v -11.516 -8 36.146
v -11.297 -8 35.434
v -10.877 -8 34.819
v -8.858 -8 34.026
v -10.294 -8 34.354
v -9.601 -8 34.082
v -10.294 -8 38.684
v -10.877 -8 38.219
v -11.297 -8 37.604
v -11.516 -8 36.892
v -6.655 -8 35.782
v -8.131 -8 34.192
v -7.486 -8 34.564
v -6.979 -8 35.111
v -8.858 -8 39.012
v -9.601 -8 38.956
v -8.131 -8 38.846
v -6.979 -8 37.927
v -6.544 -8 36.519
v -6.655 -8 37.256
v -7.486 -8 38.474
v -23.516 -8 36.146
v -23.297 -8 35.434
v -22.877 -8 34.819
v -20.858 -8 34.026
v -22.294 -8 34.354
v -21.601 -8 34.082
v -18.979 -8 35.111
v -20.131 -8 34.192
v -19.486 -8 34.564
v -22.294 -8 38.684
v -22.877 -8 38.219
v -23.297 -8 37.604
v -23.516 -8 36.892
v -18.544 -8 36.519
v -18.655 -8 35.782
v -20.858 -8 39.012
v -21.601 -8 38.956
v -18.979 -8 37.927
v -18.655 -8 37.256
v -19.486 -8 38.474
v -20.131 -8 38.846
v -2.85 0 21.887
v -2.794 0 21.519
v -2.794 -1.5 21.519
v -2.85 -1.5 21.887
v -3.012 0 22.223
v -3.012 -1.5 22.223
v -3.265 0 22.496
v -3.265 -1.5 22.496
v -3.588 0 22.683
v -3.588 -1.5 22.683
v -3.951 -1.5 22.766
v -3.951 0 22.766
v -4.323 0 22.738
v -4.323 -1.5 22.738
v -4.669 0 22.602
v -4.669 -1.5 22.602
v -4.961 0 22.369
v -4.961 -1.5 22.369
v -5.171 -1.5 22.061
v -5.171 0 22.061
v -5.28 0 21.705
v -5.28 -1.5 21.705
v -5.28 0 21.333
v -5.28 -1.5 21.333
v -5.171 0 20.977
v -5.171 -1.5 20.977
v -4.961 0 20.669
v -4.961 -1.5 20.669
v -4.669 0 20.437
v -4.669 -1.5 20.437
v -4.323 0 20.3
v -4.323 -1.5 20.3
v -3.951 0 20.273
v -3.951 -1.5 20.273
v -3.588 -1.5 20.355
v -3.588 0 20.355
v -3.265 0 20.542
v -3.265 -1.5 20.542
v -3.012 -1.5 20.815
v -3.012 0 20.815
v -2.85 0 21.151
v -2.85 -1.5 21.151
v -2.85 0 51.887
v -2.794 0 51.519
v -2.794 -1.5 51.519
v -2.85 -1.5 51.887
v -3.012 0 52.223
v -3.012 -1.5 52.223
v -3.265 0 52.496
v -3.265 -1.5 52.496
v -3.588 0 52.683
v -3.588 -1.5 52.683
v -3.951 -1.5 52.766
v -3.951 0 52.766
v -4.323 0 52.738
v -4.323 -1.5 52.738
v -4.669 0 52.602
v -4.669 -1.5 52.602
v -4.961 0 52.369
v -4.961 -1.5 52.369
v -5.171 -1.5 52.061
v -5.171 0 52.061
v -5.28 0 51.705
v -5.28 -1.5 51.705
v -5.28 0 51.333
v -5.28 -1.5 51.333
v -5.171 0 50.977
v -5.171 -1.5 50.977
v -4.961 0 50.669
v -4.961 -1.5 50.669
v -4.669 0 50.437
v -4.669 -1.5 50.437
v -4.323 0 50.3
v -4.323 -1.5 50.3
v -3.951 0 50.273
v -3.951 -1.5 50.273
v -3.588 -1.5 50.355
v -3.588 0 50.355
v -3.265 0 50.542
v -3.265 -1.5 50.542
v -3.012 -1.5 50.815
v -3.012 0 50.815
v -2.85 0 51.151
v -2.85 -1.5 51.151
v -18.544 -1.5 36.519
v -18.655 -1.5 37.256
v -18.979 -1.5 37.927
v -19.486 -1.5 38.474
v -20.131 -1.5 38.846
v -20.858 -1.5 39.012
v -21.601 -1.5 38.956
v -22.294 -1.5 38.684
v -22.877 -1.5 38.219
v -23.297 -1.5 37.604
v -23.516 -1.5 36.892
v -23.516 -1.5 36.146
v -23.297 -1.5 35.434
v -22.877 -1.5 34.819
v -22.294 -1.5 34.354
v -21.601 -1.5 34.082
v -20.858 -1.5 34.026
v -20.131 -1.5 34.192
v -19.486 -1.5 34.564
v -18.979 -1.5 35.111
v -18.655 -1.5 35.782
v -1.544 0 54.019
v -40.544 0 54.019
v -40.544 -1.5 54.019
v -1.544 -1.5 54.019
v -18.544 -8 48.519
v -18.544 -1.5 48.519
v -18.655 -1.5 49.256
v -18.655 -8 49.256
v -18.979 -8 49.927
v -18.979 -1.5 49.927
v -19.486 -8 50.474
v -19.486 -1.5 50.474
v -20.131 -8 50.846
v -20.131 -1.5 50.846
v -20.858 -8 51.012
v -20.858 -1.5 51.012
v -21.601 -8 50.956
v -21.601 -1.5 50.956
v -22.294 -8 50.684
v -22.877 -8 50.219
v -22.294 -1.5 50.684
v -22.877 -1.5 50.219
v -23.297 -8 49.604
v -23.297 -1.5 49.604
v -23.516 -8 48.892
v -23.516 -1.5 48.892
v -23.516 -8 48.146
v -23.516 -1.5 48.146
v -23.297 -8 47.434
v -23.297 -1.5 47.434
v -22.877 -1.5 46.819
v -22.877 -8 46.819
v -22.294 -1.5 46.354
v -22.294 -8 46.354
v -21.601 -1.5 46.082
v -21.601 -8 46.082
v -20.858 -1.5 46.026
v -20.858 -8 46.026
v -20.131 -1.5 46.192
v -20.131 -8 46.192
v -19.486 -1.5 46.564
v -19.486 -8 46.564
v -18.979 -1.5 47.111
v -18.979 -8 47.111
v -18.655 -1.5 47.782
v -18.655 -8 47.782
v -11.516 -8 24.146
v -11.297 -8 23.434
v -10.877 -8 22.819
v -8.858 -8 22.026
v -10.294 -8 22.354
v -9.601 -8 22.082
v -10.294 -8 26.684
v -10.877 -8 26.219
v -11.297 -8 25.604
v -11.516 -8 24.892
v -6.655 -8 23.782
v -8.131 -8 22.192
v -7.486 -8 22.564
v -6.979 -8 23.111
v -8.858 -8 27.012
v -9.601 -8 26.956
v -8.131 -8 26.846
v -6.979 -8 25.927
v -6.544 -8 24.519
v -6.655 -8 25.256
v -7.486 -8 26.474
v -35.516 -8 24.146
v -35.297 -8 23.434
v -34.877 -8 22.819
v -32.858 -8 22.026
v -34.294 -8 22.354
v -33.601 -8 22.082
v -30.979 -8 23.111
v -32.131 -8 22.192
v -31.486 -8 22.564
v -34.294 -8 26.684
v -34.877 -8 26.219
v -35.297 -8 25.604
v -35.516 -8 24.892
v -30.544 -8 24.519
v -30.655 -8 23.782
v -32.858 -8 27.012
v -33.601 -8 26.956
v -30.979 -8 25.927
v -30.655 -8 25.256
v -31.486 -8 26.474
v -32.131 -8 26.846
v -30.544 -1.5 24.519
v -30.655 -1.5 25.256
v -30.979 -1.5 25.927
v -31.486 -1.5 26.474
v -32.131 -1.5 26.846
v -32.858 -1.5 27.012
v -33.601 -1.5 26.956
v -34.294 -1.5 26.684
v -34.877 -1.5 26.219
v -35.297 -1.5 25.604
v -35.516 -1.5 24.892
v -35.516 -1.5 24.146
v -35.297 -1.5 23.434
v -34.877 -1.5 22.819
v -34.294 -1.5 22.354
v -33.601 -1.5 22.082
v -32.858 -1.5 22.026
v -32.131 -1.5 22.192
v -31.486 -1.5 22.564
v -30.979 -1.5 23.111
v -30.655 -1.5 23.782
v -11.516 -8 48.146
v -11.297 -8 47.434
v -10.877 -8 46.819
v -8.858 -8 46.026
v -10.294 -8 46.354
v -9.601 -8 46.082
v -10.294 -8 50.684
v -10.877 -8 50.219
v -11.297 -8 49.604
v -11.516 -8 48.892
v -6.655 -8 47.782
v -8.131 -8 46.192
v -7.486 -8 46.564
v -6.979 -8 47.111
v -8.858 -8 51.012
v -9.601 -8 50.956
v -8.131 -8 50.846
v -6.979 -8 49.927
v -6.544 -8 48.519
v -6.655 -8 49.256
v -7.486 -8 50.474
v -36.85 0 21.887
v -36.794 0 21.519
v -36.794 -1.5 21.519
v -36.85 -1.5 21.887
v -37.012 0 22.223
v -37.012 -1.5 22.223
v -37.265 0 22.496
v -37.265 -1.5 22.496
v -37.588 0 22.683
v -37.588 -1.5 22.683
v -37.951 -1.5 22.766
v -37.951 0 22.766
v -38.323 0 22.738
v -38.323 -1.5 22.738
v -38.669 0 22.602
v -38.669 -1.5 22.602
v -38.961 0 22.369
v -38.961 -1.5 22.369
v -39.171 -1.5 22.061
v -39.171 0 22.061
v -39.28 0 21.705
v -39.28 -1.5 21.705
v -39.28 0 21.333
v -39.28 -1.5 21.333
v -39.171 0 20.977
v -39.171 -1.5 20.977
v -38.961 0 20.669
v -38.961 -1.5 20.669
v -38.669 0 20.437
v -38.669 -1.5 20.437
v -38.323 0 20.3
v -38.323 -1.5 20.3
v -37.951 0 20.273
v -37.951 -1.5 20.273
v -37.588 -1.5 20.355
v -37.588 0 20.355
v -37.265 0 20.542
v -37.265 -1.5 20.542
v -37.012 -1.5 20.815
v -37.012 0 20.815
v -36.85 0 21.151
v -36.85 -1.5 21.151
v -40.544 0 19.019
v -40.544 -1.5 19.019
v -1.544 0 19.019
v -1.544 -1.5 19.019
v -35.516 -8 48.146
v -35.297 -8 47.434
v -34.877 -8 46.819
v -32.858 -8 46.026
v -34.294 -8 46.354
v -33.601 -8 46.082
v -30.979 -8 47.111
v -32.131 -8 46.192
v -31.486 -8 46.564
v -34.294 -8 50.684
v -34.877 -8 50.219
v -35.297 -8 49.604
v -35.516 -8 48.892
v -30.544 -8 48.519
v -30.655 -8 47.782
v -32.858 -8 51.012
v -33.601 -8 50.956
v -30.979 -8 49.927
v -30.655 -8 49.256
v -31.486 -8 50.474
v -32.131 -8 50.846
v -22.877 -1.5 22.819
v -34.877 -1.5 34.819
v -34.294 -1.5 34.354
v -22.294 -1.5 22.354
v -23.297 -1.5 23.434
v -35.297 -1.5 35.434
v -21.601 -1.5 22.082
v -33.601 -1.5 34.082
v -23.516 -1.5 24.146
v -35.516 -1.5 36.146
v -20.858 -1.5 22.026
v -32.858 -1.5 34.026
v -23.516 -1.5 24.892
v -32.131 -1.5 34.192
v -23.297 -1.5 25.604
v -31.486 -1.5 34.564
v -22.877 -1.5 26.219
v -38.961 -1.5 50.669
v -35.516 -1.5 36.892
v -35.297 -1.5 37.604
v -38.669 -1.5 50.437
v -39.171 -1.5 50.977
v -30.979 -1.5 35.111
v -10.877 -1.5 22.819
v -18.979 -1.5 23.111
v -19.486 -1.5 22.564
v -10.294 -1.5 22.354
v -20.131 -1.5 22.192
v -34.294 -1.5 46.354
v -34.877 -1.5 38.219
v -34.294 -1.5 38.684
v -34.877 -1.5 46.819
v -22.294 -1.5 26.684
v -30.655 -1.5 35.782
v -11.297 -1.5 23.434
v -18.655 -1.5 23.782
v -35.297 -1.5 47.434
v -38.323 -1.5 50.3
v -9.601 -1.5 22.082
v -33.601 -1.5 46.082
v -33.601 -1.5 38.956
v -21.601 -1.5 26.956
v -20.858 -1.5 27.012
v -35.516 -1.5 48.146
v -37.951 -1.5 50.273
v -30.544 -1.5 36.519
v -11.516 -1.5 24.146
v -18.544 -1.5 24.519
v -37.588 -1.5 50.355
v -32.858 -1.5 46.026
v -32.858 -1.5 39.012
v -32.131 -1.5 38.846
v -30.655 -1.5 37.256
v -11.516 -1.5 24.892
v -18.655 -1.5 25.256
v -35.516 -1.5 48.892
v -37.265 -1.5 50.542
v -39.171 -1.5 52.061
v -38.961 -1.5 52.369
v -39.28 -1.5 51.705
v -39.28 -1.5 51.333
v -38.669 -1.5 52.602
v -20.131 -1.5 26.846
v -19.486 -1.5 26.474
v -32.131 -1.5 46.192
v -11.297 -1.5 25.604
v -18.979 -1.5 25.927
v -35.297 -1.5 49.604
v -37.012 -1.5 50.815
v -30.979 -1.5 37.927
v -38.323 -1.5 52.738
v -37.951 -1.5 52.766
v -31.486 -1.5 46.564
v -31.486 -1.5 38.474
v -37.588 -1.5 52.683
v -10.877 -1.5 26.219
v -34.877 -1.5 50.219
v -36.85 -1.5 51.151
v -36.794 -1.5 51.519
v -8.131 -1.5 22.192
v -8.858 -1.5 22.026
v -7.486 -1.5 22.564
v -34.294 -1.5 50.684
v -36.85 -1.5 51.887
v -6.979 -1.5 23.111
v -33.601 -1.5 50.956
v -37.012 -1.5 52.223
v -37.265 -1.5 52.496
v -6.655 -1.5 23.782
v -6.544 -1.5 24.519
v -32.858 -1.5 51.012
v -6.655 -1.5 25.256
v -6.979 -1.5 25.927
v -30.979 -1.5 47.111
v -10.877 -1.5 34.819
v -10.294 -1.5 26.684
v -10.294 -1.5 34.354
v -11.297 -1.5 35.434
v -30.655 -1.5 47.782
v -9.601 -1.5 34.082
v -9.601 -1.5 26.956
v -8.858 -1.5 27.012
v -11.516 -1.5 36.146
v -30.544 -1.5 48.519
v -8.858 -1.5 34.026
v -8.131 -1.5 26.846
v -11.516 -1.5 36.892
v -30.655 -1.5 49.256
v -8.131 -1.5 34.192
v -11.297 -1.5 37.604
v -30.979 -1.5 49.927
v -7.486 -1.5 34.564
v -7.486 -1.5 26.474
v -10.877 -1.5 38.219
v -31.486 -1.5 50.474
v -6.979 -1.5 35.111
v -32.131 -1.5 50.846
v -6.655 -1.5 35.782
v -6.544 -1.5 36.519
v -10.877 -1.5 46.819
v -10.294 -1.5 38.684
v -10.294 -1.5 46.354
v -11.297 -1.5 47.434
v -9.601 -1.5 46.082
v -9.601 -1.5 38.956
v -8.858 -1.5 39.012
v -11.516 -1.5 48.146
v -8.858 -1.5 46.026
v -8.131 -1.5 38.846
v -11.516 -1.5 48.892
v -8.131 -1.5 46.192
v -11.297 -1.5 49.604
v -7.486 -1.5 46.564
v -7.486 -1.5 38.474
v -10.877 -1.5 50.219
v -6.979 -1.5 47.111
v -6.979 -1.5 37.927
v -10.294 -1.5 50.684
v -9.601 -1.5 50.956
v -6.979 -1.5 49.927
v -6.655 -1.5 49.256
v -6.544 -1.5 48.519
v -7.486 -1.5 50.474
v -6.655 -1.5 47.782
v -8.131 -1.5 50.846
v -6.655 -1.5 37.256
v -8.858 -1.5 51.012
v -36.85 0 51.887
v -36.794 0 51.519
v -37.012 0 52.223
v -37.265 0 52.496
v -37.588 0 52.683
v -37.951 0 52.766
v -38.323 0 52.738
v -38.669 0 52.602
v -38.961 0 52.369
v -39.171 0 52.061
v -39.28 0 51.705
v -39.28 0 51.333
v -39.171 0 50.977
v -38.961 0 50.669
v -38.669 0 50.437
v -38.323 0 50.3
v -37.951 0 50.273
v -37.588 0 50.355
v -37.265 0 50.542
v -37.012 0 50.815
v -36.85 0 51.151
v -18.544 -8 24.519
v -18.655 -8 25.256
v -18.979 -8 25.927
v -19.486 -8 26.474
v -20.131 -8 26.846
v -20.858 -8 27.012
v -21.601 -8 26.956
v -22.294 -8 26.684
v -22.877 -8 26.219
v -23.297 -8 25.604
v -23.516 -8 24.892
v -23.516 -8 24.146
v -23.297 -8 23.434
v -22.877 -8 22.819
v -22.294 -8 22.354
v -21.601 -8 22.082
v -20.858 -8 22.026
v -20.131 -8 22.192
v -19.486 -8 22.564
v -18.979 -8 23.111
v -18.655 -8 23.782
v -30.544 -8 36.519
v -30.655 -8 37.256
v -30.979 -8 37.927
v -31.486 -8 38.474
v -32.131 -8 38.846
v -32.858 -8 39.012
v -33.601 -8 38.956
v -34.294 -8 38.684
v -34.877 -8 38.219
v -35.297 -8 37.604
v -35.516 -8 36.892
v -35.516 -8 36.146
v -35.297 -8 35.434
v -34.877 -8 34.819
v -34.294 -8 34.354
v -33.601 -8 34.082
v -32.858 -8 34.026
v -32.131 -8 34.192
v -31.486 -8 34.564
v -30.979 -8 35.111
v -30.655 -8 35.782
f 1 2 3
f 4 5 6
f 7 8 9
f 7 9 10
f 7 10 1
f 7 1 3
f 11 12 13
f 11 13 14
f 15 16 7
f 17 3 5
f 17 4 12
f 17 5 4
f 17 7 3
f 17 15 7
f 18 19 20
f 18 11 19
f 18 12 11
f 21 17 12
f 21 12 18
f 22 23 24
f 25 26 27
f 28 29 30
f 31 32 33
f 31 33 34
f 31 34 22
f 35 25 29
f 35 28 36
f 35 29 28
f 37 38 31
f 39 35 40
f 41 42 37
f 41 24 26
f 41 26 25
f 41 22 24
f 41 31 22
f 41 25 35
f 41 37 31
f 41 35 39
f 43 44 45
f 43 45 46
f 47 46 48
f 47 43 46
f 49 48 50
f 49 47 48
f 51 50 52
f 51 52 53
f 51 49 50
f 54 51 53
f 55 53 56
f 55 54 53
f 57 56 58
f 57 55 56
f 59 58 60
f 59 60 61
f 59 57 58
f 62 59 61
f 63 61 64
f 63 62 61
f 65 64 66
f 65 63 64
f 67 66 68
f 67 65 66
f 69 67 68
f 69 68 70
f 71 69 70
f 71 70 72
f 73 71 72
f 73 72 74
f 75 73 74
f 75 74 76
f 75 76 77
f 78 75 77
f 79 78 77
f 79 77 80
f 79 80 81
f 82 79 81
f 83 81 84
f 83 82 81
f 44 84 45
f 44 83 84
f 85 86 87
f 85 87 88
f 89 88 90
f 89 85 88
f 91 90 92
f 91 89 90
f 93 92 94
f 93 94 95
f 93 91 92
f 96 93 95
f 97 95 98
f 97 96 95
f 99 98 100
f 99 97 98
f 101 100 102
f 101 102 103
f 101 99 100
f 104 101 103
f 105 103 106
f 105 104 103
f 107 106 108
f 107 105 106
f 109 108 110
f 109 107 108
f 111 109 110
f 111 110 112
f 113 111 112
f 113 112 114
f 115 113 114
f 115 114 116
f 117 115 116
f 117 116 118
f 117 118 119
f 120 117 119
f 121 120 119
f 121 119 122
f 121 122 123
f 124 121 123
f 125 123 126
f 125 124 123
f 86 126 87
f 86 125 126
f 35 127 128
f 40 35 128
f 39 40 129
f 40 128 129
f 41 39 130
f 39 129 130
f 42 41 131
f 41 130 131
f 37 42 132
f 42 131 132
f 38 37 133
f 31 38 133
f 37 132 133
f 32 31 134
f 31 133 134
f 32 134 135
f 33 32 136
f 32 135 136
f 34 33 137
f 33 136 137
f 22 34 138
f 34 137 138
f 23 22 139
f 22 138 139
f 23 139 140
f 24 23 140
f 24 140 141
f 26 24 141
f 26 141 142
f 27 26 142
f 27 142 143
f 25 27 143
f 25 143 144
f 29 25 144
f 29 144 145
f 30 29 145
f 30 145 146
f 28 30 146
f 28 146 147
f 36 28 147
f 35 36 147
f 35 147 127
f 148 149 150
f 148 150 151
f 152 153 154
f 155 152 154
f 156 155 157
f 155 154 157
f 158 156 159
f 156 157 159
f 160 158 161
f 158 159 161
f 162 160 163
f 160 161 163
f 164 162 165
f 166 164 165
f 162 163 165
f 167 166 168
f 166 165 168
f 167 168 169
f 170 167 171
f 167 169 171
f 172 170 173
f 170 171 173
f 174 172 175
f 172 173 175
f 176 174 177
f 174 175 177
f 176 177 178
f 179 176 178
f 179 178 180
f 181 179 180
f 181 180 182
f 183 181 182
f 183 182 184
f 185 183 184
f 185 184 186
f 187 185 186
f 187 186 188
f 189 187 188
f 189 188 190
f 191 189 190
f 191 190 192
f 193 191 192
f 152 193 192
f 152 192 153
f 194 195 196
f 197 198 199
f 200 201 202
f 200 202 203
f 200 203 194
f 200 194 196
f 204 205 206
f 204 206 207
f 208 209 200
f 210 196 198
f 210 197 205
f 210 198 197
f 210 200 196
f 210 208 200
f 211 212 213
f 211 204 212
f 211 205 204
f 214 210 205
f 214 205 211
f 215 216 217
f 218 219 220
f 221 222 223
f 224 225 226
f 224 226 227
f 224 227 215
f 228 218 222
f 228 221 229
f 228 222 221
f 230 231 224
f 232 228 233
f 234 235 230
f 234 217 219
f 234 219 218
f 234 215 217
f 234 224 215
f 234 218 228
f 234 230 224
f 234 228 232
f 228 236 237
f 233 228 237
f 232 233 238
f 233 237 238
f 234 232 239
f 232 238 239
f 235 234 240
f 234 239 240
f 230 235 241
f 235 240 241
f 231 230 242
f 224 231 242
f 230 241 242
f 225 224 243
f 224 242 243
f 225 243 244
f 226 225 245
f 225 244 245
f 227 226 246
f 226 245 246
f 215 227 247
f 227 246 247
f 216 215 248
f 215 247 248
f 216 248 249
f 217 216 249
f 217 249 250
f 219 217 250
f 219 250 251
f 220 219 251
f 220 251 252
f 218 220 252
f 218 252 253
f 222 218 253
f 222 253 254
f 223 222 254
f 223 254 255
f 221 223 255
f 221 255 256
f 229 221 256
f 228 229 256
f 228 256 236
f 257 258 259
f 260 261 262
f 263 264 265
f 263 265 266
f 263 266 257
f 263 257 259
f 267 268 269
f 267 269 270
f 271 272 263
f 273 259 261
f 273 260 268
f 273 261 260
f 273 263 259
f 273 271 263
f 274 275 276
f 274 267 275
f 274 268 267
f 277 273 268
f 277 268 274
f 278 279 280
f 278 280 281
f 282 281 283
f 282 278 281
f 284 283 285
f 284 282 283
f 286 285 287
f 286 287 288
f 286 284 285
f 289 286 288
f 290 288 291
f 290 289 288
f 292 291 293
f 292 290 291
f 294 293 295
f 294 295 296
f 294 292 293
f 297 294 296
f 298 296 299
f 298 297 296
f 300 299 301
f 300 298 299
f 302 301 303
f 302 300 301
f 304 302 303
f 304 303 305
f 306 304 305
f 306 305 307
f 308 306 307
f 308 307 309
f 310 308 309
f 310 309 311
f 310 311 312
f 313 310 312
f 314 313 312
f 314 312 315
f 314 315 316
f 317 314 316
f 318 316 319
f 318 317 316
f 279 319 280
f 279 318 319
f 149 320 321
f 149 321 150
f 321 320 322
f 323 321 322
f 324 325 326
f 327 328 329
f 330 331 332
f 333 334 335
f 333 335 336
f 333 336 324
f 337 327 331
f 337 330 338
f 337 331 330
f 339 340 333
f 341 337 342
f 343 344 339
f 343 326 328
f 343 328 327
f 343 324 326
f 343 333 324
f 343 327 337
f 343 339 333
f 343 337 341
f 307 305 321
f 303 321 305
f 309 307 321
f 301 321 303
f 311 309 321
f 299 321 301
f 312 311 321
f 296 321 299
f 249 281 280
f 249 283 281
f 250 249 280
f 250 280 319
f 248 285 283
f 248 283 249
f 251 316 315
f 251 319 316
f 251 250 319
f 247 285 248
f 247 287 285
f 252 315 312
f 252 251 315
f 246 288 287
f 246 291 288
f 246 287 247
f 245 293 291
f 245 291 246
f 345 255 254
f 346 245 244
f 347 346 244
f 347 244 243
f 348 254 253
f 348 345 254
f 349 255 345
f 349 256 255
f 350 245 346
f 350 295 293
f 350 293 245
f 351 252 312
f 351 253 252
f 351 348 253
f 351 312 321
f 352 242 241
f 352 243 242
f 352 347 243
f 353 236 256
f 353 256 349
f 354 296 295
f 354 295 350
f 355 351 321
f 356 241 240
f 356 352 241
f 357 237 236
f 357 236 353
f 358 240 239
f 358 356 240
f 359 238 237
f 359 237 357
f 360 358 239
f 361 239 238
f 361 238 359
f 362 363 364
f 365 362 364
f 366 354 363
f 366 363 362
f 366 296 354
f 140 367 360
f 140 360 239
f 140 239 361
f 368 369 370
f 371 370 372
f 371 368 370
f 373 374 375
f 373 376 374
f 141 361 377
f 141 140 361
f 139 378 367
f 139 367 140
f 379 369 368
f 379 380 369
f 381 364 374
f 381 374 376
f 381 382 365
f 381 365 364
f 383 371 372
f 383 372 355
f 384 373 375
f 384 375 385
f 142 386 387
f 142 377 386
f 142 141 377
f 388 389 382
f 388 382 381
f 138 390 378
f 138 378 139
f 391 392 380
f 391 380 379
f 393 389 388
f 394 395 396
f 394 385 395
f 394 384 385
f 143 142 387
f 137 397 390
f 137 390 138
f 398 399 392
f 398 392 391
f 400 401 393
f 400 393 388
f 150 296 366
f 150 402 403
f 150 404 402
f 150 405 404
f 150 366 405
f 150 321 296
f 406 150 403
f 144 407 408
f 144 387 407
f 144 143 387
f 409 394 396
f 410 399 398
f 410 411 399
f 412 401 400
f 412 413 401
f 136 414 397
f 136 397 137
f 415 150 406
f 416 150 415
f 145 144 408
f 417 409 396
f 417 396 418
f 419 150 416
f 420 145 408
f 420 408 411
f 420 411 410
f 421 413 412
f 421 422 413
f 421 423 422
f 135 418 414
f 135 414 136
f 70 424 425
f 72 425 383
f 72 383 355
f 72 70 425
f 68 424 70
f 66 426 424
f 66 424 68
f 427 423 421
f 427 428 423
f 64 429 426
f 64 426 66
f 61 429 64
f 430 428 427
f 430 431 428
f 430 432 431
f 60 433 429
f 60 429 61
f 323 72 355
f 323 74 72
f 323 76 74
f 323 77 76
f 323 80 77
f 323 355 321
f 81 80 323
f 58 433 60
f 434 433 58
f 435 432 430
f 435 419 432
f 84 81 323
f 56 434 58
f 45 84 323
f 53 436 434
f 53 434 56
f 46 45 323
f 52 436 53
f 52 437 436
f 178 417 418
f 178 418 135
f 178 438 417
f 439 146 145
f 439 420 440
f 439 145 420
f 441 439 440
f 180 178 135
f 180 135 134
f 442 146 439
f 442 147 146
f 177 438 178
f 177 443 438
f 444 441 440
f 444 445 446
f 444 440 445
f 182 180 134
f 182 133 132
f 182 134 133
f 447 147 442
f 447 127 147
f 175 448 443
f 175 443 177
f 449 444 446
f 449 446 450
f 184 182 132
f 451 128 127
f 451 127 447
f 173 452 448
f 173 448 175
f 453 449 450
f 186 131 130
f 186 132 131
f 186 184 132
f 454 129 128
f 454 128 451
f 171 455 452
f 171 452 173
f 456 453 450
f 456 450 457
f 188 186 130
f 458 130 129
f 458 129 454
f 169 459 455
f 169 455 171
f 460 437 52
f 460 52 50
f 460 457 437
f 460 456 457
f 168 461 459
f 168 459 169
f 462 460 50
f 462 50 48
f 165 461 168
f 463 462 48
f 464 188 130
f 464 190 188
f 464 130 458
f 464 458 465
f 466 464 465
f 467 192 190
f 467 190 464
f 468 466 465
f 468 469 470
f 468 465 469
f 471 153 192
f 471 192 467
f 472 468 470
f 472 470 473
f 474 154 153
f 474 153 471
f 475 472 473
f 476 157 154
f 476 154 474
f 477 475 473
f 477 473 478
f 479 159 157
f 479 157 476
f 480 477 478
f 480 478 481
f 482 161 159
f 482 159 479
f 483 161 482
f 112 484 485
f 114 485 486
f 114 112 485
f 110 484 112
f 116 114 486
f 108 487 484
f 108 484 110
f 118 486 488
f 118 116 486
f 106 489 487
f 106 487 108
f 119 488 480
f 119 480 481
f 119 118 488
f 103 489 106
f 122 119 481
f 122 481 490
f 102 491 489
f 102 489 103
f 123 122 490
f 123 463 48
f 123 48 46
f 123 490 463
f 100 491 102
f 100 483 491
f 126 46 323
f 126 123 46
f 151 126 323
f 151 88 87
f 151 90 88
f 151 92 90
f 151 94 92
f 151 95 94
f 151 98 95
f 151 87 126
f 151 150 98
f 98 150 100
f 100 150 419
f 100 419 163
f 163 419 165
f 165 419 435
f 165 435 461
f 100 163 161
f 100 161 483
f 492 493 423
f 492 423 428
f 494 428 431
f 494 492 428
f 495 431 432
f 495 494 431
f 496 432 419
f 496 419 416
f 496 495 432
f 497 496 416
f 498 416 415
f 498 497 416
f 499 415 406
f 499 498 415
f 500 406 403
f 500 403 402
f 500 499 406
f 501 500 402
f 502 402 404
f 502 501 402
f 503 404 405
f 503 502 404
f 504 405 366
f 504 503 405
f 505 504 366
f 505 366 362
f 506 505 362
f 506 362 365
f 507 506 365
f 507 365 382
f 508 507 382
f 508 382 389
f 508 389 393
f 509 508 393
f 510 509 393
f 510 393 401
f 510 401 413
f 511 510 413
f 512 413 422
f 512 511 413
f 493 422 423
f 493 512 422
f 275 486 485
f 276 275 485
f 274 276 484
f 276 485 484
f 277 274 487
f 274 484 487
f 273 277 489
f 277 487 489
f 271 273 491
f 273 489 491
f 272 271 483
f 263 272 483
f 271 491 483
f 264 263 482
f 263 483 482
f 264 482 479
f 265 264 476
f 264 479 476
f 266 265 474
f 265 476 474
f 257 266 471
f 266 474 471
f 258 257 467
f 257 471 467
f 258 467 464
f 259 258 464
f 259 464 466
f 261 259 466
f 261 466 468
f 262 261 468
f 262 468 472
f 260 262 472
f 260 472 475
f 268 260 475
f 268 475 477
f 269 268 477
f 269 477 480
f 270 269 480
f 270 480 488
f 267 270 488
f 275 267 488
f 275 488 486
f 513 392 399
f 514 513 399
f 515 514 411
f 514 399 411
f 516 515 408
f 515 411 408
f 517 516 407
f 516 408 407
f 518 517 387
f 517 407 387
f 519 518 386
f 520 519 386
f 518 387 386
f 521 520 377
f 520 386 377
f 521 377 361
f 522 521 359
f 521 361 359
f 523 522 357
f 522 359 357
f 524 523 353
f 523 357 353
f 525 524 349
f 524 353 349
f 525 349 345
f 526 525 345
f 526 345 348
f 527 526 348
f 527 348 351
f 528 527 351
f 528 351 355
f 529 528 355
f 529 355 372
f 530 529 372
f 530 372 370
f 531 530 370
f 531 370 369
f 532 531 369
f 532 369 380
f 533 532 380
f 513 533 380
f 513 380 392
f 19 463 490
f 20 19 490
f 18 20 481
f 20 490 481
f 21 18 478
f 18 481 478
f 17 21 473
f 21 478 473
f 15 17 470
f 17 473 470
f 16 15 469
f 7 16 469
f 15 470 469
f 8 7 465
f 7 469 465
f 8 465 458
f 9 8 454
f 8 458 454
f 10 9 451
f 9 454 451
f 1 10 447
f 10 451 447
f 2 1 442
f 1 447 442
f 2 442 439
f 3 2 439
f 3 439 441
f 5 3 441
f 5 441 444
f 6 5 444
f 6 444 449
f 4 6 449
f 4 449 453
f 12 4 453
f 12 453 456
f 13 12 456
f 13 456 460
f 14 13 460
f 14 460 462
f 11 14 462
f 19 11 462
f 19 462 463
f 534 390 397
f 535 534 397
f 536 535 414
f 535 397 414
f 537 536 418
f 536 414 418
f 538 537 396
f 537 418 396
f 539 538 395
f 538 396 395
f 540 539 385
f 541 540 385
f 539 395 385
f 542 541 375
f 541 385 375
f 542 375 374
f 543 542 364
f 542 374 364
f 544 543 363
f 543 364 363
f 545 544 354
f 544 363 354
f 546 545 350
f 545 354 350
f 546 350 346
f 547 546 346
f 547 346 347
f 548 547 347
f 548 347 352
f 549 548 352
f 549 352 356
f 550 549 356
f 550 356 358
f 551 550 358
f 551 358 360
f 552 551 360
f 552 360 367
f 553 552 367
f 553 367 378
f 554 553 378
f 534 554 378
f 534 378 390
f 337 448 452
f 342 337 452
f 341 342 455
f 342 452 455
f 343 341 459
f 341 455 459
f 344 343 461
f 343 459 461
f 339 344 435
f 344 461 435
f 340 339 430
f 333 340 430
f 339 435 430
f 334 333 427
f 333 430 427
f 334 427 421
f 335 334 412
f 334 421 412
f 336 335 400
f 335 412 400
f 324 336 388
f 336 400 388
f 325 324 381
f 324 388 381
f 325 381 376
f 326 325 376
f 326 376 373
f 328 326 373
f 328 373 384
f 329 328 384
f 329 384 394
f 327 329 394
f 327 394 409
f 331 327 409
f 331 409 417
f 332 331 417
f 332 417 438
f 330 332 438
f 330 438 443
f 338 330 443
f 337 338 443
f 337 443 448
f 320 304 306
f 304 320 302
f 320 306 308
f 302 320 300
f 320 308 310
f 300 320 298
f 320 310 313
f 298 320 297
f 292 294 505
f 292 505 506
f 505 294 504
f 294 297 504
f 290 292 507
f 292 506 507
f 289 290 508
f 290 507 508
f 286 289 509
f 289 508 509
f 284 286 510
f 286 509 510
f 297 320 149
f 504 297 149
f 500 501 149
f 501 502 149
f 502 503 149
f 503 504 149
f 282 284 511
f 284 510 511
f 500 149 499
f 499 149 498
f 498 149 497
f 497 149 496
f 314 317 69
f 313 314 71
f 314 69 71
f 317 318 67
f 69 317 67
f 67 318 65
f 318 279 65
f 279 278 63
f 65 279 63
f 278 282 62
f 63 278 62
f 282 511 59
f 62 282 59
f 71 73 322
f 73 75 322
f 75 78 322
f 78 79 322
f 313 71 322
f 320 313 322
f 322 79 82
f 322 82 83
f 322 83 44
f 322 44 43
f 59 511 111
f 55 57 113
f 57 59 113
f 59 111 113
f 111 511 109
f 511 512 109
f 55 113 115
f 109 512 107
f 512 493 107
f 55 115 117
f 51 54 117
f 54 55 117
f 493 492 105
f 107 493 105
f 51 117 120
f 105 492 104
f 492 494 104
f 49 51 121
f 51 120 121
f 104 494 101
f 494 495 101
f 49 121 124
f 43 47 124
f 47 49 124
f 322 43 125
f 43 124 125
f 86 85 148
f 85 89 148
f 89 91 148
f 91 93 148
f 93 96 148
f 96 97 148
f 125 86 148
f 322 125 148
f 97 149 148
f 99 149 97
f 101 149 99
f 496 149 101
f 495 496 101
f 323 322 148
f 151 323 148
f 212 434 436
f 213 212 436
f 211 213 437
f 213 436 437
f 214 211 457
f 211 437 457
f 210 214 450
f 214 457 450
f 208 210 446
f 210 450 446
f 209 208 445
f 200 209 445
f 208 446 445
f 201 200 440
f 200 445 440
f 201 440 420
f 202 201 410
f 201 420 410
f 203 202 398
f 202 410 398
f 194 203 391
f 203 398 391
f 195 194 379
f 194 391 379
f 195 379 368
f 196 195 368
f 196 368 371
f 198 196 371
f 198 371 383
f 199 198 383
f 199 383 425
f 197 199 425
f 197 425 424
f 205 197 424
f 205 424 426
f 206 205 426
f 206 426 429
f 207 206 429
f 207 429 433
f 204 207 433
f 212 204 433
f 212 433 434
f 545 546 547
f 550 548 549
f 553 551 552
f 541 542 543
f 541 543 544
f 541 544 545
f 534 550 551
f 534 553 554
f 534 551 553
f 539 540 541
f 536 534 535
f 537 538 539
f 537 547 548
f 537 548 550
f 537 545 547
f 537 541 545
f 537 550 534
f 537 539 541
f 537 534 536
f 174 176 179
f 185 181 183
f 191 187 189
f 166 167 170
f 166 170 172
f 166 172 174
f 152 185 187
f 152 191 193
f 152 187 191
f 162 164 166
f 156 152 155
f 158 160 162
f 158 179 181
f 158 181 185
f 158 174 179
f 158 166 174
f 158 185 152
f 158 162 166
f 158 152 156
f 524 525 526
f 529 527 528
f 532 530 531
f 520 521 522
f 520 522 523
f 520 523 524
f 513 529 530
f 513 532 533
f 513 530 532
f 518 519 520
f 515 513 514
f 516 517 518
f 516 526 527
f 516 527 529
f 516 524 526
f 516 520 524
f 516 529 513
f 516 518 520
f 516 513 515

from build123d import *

# Parameters (mm, degrees)
F0_W     = 39
F0_H     = 35
F0_R     = 1.25
F0_R_2   = 2.5
F1_DEPTH = 1.5
F2_DEPTH = 8


with BuildPart() as f1:
    # F0 (on Front) → F1 (new body)
    with BuildSketch(Plane.XZ):
        with Locations((-21.04439, 36.519036)):
            Rectangle(F0_W, F0_H)
        with Locations((-38.04439, 21.519036)):
            Circle(F0_R, mode=Mode.SUBTRACT)
        with Locations((-33.04439, 24.519036)):
            Circle(F0_R_2, mode=Mode.SUBTRACT)
        with Locations((-21.04439, 24.519036)):
            Circle(F0_R_2, mode=Mode.SUBTRACT)
        with Locations((-4.04439, 21.519036)):
            Circle(F0_R, mode=Mode.SUBTRACT)
        with Locations((-9.04439, 24.519036)):
            Circle(F0_R_2, mode=Mode.SUBTRACT)
        with Locations((-33.04439, 36.519036)):
            Circle(F0_R_2, mode=Mode.SUBTRACT)
        with Locations((-21.04439, 36.519036)):
            Circle(F0_R_2, mode=Mode.SUBTRACT)
        with Locations((-33.04439, 48.519036)):
            Circle(F0_R_2, mode=Mode.SUBTRACT)
        with Locations((-38.04439, 51.519036)):
            Circle(F0_R, mode=Mode.SUBTRACT)
        with Locations((-21.04439, 48.519036)):
            Circle(F0_R_2, mode=Mode.SUBTRACT)
        with Locations((-9.04439, 36.519036)):
            Circle(F0_R_2, mode=Mode.SUBTRACT)
        with Locations((-9.04439, 48.519036)):
            Circle(F0_R_2, mode=Mode.SUBTRACT)
        with Locations((-4.04439, 51.519036)):
            Circle(F0_R, mode=Mode.SUBTRACT)
    extrude(amount=F1_DEPTH)

    # F0 (on Front) → F2 (join)
    with BuildSketch(Plane.XZ):
        with Locations((-33.04439, 48.519036)):
            Circle(F0_R_2)
        with Locations((-21.04439, 48.519036)):
            Circle(F0_R_2)
        with Locations((-9.04439, 48.519036)):
            Circle(F0_R_2)
        with Locations((-33.04439, 36.519036)):
            Circle(F0_R_2)
        with Locations((-21.04439, 36.519036)):
            Circle(F0_R_2)
        with Locations((-9.04439, 36.519036)):
            Circle(F0_R_2)
        with Locations((-33.04439, 24.519036)):
            Circle(F0_R_2)
        with Locations((-21.04439, 24.519036)):
            Circle(F0_R_2)
        with Locations((-9.04439, 24.519036)):
            Circle(F0_R_2)
    extrude(amount=F2_DEPTH)


solid = f1.part
